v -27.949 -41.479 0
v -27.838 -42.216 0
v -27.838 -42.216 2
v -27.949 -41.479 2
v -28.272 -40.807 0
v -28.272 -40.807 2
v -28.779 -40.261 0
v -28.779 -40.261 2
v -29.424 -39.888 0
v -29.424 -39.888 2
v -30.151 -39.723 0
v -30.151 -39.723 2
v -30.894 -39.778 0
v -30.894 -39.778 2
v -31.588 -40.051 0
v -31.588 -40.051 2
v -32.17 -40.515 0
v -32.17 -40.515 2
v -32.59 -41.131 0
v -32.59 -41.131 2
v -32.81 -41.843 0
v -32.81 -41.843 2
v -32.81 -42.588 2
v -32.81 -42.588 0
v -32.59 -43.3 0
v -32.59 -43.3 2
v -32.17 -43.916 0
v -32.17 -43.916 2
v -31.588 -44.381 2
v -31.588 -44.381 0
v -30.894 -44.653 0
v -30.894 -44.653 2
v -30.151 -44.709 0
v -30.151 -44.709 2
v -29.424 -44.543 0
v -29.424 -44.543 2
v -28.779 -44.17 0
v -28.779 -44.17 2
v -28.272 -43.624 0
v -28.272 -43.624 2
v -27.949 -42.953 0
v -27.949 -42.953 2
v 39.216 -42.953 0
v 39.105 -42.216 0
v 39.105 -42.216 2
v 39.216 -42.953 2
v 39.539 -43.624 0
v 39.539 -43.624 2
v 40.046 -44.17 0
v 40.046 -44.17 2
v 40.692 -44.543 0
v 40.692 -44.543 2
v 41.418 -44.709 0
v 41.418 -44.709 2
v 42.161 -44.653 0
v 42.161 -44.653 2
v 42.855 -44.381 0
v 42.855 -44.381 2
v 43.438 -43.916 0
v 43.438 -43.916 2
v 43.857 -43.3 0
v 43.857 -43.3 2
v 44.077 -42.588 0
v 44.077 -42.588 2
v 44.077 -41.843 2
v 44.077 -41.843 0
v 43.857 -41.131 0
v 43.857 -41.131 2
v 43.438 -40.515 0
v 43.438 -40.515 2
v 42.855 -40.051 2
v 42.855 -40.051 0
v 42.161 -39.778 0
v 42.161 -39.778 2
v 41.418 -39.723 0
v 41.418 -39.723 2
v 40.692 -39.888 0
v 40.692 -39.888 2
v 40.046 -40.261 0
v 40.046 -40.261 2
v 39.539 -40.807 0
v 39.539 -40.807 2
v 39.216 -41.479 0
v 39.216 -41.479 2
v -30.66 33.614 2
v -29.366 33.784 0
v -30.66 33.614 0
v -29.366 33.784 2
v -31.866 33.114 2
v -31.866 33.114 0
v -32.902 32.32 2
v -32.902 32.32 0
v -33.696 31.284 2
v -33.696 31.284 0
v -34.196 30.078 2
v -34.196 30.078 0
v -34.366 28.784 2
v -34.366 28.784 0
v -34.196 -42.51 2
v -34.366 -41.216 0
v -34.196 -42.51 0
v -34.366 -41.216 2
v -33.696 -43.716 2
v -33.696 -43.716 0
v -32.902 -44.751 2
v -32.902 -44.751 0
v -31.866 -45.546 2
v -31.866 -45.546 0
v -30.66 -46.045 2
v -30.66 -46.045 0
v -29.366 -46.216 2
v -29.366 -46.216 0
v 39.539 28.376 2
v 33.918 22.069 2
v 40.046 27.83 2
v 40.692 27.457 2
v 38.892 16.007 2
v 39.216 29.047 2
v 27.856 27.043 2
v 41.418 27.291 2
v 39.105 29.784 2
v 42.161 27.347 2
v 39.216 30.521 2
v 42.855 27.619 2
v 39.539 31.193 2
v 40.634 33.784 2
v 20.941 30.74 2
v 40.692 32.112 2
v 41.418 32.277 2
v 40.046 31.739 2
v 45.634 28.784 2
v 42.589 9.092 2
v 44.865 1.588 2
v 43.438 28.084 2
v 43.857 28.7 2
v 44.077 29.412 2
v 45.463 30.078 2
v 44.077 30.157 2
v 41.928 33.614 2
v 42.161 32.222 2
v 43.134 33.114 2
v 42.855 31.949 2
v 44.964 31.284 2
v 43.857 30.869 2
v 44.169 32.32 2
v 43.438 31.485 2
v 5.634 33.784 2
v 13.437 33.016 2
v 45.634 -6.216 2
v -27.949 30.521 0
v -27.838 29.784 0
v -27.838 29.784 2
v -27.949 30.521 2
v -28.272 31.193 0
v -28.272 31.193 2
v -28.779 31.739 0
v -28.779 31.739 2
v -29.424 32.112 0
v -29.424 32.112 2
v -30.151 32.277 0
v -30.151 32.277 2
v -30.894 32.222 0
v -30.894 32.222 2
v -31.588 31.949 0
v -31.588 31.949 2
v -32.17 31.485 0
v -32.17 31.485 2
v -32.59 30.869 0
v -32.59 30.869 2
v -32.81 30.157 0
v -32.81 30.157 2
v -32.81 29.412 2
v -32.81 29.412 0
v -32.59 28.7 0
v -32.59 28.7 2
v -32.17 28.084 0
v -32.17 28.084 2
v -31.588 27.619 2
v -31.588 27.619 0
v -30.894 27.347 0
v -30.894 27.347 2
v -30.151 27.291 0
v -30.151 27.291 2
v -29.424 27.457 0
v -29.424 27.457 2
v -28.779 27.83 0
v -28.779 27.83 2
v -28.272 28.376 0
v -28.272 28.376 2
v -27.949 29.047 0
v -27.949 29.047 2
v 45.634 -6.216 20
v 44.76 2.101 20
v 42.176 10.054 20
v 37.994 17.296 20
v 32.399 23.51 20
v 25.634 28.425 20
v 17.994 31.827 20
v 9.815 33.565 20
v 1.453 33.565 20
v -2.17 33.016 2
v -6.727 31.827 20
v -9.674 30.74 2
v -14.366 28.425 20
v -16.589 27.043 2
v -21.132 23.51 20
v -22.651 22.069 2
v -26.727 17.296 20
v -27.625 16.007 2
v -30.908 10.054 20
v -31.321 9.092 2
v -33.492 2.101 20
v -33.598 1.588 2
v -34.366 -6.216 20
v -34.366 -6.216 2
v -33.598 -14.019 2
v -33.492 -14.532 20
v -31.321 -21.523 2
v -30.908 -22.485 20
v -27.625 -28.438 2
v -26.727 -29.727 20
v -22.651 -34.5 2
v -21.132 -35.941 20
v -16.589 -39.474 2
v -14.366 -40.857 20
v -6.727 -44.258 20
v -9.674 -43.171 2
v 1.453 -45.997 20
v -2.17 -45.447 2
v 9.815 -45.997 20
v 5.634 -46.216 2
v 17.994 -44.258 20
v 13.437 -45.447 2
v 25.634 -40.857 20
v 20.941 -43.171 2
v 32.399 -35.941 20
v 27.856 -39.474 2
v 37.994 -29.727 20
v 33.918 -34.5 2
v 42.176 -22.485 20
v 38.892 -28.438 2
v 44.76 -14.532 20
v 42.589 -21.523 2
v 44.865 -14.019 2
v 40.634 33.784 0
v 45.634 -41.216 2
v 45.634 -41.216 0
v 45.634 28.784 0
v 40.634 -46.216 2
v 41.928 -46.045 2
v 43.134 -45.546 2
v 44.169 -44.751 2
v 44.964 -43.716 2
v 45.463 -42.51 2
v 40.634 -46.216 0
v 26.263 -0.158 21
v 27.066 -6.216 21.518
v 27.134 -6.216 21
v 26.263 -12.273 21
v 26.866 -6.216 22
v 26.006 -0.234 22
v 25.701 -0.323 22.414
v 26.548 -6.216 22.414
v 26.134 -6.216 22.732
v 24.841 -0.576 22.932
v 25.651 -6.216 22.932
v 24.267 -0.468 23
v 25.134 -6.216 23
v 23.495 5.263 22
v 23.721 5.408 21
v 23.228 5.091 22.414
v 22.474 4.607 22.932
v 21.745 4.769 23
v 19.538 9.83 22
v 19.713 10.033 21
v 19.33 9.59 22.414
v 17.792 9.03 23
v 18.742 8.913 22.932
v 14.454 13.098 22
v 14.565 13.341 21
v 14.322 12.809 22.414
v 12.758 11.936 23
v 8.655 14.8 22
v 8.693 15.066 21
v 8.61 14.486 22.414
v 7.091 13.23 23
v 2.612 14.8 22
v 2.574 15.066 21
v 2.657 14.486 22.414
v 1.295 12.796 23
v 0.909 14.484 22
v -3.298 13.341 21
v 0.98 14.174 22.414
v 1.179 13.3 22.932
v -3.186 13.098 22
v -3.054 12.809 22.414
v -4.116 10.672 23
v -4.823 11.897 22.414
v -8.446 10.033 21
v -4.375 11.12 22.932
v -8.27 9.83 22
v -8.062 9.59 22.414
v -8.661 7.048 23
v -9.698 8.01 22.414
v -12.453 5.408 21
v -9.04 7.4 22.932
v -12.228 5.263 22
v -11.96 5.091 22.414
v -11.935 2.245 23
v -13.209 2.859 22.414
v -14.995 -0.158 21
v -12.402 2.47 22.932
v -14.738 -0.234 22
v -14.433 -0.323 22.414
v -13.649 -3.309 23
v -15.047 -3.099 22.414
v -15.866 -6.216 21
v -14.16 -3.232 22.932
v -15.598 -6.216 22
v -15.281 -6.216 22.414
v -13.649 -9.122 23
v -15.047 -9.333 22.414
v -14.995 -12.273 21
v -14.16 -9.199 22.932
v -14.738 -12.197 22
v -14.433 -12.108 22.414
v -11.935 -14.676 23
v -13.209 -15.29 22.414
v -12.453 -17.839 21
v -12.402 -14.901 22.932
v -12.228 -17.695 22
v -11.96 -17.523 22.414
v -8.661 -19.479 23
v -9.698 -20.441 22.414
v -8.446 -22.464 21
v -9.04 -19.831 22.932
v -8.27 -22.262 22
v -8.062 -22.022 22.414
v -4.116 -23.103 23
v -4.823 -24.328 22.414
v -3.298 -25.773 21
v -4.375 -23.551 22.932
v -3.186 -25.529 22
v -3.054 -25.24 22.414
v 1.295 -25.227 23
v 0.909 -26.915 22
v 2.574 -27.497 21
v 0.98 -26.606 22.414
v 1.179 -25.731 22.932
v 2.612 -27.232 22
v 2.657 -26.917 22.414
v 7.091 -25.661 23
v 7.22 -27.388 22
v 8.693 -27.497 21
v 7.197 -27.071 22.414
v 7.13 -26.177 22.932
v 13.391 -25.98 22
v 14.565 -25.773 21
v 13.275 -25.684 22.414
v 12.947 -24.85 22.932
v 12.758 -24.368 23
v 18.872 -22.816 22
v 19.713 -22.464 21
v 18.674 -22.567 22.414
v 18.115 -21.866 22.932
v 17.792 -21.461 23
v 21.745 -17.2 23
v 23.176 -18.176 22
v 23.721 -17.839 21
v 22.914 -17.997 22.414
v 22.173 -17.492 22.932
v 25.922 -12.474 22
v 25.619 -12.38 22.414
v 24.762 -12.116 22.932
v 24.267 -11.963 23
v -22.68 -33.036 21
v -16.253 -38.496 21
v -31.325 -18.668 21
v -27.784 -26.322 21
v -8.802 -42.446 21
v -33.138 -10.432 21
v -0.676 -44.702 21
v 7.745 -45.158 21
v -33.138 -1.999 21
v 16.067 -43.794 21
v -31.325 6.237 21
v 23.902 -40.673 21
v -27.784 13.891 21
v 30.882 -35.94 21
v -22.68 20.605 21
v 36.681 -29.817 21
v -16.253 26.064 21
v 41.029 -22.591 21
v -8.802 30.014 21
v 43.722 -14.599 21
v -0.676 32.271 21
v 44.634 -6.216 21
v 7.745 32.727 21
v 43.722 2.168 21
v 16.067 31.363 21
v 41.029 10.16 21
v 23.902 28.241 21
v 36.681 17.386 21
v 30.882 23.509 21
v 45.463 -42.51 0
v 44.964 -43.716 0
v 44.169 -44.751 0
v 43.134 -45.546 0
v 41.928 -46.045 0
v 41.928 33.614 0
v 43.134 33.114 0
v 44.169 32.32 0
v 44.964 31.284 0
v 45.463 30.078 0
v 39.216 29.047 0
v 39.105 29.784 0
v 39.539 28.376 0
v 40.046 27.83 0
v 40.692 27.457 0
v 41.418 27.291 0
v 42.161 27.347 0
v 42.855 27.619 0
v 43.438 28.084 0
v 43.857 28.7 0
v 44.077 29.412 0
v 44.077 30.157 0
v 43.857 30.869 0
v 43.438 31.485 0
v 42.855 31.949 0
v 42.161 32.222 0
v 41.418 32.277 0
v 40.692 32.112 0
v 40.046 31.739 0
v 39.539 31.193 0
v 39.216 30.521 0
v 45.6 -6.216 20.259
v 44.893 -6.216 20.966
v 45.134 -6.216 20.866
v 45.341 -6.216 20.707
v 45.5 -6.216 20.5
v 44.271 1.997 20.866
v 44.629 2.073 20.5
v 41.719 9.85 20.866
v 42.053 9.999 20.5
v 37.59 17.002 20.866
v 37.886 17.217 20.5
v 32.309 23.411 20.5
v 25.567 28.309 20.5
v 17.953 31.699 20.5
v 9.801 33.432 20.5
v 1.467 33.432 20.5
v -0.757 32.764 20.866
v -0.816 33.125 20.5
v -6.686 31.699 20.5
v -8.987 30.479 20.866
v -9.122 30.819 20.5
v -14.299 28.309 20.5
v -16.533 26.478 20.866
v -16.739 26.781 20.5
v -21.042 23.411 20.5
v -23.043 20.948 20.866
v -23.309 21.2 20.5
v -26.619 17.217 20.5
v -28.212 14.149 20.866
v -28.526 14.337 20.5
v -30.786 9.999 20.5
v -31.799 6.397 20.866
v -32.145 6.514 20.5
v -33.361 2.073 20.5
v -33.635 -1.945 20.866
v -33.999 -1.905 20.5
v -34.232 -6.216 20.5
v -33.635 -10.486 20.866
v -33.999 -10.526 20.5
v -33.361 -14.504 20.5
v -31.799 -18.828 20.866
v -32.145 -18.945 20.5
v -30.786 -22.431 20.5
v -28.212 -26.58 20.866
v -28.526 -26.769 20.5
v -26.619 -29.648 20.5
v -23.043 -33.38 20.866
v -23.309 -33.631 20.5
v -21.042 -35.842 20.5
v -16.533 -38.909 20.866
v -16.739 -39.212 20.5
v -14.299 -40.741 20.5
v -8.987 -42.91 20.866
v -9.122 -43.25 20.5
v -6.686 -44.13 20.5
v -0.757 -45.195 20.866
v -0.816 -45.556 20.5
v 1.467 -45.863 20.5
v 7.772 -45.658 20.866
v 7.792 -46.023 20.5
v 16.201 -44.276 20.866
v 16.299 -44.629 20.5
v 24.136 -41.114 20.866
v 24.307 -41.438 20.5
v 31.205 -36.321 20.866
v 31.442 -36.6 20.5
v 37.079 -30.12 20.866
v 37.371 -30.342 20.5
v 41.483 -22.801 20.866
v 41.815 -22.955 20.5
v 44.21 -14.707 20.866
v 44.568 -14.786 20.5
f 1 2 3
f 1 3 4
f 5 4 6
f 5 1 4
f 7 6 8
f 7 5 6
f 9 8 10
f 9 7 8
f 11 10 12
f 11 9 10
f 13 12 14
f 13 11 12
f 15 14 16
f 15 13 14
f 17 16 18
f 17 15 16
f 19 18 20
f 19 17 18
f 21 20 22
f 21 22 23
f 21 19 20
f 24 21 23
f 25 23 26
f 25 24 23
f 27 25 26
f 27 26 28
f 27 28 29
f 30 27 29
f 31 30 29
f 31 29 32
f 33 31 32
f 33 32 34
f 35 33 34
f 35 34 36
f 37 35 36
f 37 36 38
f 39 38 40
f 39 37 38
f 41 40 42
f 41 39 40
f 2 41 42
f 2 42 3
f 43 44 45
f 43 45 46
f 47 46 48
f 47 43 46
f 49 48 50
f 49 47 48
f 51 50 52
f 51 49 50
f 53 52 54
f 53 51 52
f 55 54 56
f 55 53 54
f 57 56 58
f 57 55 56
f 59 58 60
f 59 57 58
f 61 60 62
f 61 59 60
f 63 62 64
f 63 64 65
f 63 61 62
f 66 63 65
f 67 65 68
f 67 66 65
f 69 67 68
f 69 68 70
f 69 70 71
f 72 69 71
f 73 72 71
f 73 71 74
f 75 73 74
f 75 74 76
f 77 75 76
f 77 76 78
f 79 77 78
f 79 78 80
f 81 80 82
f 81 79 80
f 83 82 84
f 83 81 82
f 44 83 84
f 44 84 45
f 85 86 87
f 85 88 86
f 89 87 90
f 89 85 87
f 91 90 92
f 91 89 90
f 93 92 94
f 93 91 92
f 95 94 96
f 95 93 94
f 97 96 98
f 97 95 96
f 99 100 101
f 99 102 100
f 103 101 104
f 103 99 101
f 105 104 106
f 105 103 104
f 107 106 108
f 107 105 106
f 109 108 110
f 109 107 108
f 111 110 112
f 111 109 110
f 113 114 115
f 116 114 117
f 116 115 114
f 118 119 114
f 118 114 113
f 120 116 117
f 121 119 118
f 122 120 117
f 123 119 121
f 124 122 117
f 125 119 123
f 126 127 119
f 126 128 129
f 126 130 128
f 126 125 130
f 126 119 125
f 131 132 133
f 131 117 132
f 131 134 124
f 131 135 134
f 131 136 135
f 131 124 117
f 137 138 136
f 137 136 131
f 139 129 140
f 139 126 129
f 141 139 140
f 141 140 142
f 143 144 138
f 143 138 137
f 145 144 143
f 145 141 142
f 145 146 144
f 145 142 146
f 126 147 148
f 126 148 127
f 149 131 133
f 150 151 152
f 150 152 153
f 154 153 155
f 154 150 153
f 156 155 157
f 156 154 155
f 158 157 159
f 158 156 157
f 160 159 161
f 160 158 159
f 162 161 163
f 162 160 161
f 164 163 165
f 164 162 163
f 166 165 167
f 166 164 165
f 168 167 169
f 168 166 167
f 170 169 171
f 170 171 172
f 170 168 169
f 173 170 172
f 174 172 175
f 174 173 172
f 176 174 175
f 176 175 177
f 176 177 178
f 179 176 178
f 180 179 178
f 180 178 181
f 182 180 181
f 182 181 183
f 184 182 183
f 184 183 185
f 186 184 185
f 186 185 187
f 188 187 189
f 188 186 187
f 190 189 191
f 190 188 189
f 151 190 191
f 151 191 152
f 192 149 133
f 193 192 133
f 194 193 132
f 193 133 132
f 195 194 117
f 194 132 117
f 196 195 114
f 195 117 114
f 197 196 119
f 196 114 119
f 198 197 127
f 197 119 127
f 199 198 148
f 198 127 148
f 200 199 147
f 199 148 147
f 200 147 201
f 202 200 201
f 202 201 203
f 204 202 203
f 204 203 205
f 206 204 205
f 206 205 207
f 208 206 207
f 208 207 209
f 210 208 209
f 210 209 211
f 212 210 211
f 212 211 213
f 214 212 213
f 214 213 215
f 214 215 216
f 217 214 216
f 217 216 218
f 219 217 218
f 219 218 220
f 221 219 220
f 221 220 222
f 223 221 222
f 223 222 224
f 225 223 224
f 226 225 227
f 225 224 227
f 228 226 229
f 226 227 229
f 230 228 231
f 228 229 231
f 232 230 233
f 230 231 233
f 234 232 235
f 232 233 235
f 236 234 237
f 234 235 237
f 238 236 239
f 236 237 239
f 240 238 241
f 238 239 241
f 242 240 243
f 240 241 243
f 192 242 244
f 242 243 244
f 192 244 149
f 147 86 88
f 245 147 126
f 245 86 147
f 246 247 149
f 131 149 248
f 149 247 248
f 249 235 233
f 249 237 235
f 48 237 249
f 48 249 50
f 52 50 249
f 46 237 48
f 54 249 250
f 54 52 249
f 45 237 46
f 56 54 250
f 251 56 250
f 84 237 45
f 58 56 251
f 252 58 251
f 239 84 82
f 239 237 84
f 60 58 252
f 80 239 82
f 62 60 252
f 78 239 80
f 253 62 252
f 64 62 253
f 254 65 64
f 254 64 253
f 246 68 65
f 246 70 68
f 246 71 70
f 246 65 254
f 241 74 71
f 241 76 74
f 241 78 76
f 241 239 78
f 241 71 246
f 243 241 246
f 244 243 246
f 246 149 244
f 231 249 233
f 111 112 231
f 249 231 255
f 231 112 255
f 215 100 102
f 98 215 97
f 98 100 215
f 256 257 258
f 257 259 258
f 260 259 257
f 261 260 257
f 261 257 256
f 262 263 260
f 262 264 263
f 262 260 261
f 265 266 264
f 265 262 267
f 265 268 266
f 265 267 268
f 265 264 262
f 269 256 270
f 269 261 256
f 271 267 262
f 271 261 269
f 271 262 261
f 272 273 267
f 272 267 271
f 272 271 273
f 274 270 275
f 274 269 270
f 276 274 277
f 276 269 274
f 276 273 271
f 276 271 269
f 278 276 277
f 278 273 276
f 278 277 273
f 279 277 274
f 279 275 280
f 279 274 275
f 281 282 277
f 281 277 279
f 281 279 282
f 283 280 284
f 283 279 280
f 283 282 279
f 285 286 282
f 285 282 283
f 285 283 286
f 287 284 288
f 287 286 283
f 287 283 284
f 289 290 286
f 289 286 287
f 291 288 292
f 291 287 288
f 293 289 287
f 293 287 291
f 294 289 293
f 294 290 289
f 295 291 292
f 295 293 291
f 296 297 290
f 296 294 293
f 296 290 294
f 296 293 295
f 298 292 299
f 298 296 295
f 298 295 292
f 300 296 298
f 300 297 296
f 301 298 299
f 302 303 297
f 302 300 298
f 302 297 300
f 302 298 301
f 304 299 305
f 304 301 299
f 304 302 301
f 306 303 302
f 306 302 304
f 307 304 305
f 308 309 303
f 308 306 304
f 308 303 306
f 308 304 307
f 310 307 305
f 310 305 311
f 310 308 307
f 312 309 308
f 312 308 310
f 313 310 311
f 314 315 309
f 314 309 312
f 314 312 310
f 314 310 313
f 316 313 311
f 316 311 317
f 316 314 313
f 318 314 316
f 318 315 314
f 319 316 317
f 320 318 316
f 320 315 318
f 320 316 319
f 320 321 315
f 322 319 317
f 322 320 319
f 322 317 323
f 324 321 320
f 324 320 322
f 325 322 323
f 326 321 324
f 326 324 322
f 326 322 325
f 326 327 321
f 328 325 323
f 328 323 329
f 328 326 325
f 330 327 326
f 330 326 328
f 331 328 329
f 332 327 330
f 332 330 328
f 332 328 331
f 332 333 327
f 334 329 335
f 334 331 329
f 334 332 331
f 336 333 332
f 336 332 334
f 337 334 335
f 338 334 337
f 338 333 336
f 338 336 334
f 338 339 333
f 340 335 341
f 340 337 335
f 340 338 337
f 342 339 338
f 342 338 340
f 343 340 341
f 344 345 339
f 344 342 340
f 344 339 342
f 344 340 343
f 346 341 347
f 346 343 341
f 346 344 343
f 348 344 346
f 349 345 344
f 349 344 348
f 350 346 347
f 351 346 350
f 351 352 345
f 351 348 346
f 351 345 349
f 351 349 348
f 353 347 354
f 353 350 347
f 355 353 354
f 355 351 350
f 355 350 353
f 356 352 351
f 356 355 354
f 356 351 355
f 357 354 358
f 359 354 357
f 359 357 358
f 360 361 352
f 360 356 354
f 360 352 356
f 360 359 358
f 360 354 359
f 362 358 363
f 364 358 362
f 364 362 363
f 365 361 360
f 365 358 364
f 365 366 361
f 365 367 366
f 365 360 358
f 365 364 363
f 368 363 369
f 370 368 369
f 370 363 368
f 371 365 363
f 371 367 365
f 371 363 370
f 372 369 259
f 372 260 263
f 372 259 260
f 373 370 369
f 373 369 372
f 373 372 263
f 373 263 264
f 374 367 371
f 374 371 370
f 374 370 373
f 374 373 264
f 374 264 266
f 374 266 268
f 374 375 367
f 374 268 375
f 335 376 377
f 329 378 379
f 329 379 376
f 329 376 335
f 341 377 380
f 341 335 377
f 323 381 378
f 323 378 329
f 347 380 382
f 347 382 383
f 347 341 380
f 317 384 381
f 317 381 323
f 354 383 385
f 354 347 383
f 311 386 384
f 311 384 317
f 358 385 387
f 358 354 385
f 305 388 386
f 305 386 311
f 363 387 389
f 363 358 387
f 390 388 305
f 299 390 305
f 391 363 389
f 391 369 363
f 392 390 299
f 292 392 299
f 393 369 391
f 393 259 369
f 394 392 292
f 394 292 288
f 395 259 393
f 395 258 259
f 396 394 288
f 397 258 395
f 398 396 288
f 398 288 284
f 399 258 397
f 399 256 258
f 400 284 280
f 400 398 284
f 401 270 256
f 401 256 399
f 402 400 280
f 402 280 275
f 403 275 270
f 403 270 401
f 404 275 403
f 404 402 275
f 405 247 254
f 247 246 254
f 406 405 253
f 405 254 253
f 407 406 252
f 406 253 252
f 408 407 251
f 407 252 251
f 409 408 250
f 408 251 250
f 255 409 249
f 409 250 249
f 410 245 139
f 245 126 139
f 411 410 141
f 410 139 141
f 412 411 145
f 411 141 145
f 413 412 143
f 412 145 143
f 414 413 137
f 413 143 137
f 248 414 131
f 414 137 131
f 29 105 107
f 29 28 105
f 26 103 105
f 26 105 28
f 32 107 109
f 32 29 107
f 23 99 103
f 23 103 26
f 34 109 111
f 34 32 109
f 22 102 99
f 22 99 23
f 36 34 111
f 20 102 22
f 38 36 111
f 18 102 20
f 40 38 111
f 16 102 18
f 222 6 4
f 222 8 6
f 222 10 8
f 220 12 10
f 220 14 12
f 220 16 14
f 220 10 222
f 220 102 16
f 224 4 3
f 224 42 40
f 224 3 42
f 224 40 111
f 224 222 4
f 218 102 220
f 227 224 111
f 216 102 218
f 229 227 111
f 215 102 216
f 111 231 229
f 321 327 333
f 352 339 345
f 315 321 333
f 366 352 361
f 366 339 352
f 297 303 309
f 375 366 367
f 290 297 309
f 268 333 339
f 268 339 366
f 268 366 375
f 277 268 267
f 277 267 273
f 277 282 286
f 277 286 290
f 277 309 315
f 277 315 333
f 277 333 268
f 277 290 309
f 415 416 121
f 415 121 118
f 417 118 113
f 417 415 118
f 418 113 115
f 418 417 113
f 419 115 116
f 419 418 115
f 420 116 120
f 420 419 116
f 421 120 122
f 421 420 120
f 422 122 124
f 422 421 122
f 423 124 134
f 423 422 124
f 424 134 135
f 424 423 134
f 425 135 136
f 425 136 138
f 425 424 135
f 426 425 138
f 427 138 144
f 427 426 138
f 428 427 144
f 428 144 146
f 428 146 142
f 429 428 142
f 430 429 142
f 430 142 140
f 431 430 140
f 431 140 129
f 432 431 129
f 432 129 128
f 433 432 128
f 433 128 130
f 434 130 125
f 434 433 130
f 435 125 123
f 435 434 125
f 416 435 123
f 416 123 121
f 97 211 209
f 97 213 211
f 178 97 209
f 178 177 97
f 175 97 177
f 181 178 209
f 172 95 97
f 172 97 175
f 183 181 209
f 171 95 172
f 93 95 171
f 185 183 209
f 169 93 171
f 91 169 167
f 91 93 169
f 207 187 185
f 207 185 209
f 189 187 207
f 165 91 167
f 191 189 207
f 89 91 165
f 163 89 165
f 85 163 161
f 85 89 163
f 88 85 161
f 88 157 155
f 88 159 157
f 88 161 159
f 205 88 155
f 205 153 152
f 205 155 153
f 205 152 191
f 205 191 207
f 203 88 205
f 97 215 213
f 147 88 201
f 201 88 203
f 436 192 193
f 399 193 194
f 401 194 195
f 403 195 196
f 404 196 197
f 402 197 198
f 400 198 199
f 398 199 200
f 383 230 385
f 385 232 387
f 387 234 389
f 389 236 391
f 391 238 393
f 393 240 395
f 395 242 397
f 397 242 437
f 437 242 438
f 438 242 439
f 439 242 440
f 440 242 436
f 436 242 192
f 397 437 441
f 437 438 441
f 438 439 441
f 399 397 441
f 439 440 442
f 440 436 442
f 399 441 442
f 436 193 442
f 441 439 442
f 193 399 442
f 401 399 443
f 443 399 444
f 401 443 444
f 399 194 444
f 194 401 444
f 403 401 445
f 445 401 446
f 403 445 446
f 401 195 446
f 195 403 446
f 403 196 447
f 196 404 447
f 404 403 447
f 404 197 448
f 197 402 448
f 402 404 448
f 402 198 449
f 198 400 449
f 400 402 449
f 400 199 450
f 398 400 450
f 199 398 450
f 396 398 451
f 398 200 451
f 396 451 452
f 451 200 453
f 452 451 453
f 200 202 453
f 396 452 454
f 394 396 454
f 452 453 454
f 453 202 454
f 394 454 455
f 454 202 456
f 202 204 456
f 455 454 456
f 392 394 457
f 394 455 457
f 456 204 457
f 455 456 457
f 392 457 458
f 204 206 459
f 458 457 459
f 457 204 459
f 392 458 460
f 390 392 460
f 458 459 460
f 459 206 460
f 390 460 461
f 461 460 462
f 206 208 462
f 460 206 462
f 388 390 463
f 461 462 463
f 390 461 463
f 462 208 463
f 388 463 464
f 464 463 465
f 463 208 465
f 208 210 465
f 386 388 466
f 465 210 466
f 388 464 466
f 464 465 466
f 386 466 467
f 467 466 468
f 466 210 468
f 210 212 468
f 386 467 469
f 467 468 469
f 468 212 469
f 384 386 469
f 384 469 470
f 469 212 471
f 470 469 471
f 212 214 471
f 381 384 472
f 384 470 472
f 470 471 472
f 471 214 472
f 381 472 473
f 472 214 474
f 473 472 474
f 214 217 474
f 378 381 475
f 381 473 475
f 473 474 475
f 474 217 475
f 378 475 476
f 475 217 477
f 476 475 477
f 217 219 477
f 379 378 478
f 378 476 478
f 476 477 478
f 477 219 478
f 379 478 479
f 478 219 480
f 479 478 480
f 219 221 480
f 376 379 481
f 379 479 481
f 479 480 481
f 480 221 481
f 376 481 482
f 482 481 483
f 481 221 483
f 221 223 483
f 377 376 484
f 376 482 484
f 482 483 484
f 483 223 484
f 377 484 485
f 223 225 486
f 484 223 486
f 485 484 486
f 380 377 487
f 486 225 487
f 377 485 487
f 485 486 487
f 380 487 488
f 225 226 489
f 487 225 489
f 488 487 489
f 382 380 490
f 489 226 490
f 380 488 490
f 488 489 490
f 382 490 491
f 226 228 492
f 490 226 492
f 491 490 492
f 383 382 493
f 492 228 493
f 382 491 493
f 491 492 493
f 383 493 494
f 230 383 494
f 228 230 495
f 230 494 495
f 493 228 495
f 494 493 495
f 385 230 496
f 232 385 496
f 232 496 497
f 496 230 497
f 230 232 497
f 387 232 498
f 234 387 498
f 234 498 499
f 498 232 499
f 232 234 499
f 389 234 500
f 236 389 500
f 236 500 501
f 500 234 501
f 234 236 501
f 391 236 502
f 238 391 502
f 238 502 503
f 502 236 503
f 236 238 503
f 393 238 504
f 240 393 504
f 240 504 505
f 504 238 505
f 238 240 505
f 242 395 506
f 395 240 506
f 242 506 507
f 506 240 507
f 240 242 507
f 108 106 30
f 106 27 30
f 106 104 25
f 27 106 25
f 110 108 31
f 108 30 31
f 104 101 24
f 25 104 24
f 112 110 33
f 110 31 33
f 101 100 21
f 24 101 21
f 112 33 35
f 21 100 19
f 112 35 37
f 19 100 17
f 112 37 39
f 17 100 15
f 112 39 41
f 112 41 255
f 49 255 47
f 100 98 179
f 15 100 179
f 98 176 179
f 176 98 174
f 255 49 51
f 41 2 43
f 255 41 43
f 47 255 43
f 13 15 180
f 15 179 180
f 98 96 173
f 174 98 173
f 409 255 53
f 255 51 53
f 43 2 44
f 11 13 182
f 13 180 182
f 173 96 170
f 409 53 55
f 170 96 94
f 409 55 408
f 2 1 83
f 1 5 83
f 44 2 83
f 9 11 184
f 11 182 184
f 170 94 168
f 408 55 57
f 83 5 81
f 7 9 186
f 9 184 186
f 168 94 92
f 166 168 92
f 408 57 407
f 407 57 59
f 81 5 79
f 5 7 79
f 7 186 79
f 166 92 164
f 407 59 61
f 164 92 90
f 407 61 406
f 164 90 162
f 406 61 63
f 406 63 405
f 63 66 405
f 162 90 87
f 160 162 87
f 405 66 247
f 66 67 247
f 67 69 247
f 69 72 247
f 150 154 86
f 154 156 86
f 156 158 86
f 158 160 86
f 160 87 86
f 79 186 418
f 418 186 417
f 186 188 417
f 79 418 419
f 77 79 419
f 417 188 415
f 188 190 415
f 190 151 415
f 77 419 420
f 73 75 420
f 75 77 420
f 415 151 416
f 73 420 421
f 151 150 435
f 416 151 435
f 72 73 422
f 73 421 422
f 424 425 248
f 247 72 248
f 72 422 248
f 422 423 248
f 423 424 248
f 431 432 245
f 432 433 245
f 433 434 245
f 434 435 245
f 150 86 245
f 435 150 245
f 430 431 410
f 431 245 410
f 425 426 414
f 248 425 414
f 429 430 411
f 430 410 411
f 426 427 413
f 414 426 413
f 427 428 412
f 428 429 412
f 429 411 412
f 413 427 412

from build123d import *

# Parameters (mm, degrees)
ESQUISSE1_W        = 80
ESQUISSE1_H        = 80
ESQUISSE1_R        = 2.5
BOSS_EXTRU_1_DEPTH = 2
ESQUISSE2_R        = 40
BOSS_EXTRU_2_DEPTH = 19
ESQUISSE3_R        = 21.5
BOSS_EXTRU_3_DEPTH = 2
CONG_1_R           = 5
CONG_2_R           = 2
CONG_3_R           = 1


with BuildPart() as part:
    # Esquisse1 → Boss.-Extru.1 (new body)
    with BuildSketch(Plane.XY):
        with Locations((5.633683954, -6.21564482)):
            Rectangle(ESQUISSE1_W, ESQUISSE1_H)
        with Locations((-30.337555091, 29.78435518)):
            Circle(ESQUISSE1_R, mode=Mode.SUBTRACT)
        with Locations((-30.337555091, -42.21564482)):
            Circle(ESQUISSE1_R, mode=Mode.SUBTRACT)
        with Locations(Location((41.604923, -42.21564482, 0), (0, 0, 180))):
            Circle(ESQUISSE1_R, mode=Mode.SUBTRACT)
        with Locations(Location((41.604923, 29.78435518, 0), (0, 0, 180))):
            Circle(ESQUISSE1_R, mode=Mode.SUBTRACT)
    extrude(amount=BOSS_EXTRU_1_DEPTH)

    # Esquisse2 → Boss.-Extru.2 (add)
    with BuildSketch(Plane.XY.offset(2)):
        with Locations((5.633683954, -6.21564482)):
            Circle(ESQUISSE2_R)
    extrude(amount=BOSS_EXTRU_2_DEPTH)

    # Esquisse3 → Boss.-Extru.3 (add)
    with BuildSketch(Plane.XY.offset(21)):
        with Locations((5.633683954, -6.21564482)):
            Circle(ESQUISSE3_R)
    extrude(amount=BOSS_EXTRU_3_DEPTH)

    # Congé1
    cong_1_edges = [part.edges().sort_by_distance(p)[0] for p in [
        (-34.366316046, 33.78435518, 1),
        (45.633683954, 33.78435518, 1),
        (45.633683954, -46.21564482, 1),
        (-34.366316046, -46.21564482, 1),
    ]]
    fillet(cong_1_edges, radius=CONG_1_R)

    # Congé2
    cong_2_edges = [part.edges().sort_by_distance(p)[0] for p in [
        (-15.866316046, -6.21564482, 23),
    ]]
    fillet(cong_2_edges, radius=CONG_2_R - 0.0001)  # a hair under: the kernel refuses the full size

    # Congé3
    cong_3_edges = [part.edges().sort_by_distance(p)[0] for p in [
        (-34.366316046, -6.21564482, 21),
    ]]
    fillet(cong_3_edges, radius=CONG_3_R)


solid = part.part
